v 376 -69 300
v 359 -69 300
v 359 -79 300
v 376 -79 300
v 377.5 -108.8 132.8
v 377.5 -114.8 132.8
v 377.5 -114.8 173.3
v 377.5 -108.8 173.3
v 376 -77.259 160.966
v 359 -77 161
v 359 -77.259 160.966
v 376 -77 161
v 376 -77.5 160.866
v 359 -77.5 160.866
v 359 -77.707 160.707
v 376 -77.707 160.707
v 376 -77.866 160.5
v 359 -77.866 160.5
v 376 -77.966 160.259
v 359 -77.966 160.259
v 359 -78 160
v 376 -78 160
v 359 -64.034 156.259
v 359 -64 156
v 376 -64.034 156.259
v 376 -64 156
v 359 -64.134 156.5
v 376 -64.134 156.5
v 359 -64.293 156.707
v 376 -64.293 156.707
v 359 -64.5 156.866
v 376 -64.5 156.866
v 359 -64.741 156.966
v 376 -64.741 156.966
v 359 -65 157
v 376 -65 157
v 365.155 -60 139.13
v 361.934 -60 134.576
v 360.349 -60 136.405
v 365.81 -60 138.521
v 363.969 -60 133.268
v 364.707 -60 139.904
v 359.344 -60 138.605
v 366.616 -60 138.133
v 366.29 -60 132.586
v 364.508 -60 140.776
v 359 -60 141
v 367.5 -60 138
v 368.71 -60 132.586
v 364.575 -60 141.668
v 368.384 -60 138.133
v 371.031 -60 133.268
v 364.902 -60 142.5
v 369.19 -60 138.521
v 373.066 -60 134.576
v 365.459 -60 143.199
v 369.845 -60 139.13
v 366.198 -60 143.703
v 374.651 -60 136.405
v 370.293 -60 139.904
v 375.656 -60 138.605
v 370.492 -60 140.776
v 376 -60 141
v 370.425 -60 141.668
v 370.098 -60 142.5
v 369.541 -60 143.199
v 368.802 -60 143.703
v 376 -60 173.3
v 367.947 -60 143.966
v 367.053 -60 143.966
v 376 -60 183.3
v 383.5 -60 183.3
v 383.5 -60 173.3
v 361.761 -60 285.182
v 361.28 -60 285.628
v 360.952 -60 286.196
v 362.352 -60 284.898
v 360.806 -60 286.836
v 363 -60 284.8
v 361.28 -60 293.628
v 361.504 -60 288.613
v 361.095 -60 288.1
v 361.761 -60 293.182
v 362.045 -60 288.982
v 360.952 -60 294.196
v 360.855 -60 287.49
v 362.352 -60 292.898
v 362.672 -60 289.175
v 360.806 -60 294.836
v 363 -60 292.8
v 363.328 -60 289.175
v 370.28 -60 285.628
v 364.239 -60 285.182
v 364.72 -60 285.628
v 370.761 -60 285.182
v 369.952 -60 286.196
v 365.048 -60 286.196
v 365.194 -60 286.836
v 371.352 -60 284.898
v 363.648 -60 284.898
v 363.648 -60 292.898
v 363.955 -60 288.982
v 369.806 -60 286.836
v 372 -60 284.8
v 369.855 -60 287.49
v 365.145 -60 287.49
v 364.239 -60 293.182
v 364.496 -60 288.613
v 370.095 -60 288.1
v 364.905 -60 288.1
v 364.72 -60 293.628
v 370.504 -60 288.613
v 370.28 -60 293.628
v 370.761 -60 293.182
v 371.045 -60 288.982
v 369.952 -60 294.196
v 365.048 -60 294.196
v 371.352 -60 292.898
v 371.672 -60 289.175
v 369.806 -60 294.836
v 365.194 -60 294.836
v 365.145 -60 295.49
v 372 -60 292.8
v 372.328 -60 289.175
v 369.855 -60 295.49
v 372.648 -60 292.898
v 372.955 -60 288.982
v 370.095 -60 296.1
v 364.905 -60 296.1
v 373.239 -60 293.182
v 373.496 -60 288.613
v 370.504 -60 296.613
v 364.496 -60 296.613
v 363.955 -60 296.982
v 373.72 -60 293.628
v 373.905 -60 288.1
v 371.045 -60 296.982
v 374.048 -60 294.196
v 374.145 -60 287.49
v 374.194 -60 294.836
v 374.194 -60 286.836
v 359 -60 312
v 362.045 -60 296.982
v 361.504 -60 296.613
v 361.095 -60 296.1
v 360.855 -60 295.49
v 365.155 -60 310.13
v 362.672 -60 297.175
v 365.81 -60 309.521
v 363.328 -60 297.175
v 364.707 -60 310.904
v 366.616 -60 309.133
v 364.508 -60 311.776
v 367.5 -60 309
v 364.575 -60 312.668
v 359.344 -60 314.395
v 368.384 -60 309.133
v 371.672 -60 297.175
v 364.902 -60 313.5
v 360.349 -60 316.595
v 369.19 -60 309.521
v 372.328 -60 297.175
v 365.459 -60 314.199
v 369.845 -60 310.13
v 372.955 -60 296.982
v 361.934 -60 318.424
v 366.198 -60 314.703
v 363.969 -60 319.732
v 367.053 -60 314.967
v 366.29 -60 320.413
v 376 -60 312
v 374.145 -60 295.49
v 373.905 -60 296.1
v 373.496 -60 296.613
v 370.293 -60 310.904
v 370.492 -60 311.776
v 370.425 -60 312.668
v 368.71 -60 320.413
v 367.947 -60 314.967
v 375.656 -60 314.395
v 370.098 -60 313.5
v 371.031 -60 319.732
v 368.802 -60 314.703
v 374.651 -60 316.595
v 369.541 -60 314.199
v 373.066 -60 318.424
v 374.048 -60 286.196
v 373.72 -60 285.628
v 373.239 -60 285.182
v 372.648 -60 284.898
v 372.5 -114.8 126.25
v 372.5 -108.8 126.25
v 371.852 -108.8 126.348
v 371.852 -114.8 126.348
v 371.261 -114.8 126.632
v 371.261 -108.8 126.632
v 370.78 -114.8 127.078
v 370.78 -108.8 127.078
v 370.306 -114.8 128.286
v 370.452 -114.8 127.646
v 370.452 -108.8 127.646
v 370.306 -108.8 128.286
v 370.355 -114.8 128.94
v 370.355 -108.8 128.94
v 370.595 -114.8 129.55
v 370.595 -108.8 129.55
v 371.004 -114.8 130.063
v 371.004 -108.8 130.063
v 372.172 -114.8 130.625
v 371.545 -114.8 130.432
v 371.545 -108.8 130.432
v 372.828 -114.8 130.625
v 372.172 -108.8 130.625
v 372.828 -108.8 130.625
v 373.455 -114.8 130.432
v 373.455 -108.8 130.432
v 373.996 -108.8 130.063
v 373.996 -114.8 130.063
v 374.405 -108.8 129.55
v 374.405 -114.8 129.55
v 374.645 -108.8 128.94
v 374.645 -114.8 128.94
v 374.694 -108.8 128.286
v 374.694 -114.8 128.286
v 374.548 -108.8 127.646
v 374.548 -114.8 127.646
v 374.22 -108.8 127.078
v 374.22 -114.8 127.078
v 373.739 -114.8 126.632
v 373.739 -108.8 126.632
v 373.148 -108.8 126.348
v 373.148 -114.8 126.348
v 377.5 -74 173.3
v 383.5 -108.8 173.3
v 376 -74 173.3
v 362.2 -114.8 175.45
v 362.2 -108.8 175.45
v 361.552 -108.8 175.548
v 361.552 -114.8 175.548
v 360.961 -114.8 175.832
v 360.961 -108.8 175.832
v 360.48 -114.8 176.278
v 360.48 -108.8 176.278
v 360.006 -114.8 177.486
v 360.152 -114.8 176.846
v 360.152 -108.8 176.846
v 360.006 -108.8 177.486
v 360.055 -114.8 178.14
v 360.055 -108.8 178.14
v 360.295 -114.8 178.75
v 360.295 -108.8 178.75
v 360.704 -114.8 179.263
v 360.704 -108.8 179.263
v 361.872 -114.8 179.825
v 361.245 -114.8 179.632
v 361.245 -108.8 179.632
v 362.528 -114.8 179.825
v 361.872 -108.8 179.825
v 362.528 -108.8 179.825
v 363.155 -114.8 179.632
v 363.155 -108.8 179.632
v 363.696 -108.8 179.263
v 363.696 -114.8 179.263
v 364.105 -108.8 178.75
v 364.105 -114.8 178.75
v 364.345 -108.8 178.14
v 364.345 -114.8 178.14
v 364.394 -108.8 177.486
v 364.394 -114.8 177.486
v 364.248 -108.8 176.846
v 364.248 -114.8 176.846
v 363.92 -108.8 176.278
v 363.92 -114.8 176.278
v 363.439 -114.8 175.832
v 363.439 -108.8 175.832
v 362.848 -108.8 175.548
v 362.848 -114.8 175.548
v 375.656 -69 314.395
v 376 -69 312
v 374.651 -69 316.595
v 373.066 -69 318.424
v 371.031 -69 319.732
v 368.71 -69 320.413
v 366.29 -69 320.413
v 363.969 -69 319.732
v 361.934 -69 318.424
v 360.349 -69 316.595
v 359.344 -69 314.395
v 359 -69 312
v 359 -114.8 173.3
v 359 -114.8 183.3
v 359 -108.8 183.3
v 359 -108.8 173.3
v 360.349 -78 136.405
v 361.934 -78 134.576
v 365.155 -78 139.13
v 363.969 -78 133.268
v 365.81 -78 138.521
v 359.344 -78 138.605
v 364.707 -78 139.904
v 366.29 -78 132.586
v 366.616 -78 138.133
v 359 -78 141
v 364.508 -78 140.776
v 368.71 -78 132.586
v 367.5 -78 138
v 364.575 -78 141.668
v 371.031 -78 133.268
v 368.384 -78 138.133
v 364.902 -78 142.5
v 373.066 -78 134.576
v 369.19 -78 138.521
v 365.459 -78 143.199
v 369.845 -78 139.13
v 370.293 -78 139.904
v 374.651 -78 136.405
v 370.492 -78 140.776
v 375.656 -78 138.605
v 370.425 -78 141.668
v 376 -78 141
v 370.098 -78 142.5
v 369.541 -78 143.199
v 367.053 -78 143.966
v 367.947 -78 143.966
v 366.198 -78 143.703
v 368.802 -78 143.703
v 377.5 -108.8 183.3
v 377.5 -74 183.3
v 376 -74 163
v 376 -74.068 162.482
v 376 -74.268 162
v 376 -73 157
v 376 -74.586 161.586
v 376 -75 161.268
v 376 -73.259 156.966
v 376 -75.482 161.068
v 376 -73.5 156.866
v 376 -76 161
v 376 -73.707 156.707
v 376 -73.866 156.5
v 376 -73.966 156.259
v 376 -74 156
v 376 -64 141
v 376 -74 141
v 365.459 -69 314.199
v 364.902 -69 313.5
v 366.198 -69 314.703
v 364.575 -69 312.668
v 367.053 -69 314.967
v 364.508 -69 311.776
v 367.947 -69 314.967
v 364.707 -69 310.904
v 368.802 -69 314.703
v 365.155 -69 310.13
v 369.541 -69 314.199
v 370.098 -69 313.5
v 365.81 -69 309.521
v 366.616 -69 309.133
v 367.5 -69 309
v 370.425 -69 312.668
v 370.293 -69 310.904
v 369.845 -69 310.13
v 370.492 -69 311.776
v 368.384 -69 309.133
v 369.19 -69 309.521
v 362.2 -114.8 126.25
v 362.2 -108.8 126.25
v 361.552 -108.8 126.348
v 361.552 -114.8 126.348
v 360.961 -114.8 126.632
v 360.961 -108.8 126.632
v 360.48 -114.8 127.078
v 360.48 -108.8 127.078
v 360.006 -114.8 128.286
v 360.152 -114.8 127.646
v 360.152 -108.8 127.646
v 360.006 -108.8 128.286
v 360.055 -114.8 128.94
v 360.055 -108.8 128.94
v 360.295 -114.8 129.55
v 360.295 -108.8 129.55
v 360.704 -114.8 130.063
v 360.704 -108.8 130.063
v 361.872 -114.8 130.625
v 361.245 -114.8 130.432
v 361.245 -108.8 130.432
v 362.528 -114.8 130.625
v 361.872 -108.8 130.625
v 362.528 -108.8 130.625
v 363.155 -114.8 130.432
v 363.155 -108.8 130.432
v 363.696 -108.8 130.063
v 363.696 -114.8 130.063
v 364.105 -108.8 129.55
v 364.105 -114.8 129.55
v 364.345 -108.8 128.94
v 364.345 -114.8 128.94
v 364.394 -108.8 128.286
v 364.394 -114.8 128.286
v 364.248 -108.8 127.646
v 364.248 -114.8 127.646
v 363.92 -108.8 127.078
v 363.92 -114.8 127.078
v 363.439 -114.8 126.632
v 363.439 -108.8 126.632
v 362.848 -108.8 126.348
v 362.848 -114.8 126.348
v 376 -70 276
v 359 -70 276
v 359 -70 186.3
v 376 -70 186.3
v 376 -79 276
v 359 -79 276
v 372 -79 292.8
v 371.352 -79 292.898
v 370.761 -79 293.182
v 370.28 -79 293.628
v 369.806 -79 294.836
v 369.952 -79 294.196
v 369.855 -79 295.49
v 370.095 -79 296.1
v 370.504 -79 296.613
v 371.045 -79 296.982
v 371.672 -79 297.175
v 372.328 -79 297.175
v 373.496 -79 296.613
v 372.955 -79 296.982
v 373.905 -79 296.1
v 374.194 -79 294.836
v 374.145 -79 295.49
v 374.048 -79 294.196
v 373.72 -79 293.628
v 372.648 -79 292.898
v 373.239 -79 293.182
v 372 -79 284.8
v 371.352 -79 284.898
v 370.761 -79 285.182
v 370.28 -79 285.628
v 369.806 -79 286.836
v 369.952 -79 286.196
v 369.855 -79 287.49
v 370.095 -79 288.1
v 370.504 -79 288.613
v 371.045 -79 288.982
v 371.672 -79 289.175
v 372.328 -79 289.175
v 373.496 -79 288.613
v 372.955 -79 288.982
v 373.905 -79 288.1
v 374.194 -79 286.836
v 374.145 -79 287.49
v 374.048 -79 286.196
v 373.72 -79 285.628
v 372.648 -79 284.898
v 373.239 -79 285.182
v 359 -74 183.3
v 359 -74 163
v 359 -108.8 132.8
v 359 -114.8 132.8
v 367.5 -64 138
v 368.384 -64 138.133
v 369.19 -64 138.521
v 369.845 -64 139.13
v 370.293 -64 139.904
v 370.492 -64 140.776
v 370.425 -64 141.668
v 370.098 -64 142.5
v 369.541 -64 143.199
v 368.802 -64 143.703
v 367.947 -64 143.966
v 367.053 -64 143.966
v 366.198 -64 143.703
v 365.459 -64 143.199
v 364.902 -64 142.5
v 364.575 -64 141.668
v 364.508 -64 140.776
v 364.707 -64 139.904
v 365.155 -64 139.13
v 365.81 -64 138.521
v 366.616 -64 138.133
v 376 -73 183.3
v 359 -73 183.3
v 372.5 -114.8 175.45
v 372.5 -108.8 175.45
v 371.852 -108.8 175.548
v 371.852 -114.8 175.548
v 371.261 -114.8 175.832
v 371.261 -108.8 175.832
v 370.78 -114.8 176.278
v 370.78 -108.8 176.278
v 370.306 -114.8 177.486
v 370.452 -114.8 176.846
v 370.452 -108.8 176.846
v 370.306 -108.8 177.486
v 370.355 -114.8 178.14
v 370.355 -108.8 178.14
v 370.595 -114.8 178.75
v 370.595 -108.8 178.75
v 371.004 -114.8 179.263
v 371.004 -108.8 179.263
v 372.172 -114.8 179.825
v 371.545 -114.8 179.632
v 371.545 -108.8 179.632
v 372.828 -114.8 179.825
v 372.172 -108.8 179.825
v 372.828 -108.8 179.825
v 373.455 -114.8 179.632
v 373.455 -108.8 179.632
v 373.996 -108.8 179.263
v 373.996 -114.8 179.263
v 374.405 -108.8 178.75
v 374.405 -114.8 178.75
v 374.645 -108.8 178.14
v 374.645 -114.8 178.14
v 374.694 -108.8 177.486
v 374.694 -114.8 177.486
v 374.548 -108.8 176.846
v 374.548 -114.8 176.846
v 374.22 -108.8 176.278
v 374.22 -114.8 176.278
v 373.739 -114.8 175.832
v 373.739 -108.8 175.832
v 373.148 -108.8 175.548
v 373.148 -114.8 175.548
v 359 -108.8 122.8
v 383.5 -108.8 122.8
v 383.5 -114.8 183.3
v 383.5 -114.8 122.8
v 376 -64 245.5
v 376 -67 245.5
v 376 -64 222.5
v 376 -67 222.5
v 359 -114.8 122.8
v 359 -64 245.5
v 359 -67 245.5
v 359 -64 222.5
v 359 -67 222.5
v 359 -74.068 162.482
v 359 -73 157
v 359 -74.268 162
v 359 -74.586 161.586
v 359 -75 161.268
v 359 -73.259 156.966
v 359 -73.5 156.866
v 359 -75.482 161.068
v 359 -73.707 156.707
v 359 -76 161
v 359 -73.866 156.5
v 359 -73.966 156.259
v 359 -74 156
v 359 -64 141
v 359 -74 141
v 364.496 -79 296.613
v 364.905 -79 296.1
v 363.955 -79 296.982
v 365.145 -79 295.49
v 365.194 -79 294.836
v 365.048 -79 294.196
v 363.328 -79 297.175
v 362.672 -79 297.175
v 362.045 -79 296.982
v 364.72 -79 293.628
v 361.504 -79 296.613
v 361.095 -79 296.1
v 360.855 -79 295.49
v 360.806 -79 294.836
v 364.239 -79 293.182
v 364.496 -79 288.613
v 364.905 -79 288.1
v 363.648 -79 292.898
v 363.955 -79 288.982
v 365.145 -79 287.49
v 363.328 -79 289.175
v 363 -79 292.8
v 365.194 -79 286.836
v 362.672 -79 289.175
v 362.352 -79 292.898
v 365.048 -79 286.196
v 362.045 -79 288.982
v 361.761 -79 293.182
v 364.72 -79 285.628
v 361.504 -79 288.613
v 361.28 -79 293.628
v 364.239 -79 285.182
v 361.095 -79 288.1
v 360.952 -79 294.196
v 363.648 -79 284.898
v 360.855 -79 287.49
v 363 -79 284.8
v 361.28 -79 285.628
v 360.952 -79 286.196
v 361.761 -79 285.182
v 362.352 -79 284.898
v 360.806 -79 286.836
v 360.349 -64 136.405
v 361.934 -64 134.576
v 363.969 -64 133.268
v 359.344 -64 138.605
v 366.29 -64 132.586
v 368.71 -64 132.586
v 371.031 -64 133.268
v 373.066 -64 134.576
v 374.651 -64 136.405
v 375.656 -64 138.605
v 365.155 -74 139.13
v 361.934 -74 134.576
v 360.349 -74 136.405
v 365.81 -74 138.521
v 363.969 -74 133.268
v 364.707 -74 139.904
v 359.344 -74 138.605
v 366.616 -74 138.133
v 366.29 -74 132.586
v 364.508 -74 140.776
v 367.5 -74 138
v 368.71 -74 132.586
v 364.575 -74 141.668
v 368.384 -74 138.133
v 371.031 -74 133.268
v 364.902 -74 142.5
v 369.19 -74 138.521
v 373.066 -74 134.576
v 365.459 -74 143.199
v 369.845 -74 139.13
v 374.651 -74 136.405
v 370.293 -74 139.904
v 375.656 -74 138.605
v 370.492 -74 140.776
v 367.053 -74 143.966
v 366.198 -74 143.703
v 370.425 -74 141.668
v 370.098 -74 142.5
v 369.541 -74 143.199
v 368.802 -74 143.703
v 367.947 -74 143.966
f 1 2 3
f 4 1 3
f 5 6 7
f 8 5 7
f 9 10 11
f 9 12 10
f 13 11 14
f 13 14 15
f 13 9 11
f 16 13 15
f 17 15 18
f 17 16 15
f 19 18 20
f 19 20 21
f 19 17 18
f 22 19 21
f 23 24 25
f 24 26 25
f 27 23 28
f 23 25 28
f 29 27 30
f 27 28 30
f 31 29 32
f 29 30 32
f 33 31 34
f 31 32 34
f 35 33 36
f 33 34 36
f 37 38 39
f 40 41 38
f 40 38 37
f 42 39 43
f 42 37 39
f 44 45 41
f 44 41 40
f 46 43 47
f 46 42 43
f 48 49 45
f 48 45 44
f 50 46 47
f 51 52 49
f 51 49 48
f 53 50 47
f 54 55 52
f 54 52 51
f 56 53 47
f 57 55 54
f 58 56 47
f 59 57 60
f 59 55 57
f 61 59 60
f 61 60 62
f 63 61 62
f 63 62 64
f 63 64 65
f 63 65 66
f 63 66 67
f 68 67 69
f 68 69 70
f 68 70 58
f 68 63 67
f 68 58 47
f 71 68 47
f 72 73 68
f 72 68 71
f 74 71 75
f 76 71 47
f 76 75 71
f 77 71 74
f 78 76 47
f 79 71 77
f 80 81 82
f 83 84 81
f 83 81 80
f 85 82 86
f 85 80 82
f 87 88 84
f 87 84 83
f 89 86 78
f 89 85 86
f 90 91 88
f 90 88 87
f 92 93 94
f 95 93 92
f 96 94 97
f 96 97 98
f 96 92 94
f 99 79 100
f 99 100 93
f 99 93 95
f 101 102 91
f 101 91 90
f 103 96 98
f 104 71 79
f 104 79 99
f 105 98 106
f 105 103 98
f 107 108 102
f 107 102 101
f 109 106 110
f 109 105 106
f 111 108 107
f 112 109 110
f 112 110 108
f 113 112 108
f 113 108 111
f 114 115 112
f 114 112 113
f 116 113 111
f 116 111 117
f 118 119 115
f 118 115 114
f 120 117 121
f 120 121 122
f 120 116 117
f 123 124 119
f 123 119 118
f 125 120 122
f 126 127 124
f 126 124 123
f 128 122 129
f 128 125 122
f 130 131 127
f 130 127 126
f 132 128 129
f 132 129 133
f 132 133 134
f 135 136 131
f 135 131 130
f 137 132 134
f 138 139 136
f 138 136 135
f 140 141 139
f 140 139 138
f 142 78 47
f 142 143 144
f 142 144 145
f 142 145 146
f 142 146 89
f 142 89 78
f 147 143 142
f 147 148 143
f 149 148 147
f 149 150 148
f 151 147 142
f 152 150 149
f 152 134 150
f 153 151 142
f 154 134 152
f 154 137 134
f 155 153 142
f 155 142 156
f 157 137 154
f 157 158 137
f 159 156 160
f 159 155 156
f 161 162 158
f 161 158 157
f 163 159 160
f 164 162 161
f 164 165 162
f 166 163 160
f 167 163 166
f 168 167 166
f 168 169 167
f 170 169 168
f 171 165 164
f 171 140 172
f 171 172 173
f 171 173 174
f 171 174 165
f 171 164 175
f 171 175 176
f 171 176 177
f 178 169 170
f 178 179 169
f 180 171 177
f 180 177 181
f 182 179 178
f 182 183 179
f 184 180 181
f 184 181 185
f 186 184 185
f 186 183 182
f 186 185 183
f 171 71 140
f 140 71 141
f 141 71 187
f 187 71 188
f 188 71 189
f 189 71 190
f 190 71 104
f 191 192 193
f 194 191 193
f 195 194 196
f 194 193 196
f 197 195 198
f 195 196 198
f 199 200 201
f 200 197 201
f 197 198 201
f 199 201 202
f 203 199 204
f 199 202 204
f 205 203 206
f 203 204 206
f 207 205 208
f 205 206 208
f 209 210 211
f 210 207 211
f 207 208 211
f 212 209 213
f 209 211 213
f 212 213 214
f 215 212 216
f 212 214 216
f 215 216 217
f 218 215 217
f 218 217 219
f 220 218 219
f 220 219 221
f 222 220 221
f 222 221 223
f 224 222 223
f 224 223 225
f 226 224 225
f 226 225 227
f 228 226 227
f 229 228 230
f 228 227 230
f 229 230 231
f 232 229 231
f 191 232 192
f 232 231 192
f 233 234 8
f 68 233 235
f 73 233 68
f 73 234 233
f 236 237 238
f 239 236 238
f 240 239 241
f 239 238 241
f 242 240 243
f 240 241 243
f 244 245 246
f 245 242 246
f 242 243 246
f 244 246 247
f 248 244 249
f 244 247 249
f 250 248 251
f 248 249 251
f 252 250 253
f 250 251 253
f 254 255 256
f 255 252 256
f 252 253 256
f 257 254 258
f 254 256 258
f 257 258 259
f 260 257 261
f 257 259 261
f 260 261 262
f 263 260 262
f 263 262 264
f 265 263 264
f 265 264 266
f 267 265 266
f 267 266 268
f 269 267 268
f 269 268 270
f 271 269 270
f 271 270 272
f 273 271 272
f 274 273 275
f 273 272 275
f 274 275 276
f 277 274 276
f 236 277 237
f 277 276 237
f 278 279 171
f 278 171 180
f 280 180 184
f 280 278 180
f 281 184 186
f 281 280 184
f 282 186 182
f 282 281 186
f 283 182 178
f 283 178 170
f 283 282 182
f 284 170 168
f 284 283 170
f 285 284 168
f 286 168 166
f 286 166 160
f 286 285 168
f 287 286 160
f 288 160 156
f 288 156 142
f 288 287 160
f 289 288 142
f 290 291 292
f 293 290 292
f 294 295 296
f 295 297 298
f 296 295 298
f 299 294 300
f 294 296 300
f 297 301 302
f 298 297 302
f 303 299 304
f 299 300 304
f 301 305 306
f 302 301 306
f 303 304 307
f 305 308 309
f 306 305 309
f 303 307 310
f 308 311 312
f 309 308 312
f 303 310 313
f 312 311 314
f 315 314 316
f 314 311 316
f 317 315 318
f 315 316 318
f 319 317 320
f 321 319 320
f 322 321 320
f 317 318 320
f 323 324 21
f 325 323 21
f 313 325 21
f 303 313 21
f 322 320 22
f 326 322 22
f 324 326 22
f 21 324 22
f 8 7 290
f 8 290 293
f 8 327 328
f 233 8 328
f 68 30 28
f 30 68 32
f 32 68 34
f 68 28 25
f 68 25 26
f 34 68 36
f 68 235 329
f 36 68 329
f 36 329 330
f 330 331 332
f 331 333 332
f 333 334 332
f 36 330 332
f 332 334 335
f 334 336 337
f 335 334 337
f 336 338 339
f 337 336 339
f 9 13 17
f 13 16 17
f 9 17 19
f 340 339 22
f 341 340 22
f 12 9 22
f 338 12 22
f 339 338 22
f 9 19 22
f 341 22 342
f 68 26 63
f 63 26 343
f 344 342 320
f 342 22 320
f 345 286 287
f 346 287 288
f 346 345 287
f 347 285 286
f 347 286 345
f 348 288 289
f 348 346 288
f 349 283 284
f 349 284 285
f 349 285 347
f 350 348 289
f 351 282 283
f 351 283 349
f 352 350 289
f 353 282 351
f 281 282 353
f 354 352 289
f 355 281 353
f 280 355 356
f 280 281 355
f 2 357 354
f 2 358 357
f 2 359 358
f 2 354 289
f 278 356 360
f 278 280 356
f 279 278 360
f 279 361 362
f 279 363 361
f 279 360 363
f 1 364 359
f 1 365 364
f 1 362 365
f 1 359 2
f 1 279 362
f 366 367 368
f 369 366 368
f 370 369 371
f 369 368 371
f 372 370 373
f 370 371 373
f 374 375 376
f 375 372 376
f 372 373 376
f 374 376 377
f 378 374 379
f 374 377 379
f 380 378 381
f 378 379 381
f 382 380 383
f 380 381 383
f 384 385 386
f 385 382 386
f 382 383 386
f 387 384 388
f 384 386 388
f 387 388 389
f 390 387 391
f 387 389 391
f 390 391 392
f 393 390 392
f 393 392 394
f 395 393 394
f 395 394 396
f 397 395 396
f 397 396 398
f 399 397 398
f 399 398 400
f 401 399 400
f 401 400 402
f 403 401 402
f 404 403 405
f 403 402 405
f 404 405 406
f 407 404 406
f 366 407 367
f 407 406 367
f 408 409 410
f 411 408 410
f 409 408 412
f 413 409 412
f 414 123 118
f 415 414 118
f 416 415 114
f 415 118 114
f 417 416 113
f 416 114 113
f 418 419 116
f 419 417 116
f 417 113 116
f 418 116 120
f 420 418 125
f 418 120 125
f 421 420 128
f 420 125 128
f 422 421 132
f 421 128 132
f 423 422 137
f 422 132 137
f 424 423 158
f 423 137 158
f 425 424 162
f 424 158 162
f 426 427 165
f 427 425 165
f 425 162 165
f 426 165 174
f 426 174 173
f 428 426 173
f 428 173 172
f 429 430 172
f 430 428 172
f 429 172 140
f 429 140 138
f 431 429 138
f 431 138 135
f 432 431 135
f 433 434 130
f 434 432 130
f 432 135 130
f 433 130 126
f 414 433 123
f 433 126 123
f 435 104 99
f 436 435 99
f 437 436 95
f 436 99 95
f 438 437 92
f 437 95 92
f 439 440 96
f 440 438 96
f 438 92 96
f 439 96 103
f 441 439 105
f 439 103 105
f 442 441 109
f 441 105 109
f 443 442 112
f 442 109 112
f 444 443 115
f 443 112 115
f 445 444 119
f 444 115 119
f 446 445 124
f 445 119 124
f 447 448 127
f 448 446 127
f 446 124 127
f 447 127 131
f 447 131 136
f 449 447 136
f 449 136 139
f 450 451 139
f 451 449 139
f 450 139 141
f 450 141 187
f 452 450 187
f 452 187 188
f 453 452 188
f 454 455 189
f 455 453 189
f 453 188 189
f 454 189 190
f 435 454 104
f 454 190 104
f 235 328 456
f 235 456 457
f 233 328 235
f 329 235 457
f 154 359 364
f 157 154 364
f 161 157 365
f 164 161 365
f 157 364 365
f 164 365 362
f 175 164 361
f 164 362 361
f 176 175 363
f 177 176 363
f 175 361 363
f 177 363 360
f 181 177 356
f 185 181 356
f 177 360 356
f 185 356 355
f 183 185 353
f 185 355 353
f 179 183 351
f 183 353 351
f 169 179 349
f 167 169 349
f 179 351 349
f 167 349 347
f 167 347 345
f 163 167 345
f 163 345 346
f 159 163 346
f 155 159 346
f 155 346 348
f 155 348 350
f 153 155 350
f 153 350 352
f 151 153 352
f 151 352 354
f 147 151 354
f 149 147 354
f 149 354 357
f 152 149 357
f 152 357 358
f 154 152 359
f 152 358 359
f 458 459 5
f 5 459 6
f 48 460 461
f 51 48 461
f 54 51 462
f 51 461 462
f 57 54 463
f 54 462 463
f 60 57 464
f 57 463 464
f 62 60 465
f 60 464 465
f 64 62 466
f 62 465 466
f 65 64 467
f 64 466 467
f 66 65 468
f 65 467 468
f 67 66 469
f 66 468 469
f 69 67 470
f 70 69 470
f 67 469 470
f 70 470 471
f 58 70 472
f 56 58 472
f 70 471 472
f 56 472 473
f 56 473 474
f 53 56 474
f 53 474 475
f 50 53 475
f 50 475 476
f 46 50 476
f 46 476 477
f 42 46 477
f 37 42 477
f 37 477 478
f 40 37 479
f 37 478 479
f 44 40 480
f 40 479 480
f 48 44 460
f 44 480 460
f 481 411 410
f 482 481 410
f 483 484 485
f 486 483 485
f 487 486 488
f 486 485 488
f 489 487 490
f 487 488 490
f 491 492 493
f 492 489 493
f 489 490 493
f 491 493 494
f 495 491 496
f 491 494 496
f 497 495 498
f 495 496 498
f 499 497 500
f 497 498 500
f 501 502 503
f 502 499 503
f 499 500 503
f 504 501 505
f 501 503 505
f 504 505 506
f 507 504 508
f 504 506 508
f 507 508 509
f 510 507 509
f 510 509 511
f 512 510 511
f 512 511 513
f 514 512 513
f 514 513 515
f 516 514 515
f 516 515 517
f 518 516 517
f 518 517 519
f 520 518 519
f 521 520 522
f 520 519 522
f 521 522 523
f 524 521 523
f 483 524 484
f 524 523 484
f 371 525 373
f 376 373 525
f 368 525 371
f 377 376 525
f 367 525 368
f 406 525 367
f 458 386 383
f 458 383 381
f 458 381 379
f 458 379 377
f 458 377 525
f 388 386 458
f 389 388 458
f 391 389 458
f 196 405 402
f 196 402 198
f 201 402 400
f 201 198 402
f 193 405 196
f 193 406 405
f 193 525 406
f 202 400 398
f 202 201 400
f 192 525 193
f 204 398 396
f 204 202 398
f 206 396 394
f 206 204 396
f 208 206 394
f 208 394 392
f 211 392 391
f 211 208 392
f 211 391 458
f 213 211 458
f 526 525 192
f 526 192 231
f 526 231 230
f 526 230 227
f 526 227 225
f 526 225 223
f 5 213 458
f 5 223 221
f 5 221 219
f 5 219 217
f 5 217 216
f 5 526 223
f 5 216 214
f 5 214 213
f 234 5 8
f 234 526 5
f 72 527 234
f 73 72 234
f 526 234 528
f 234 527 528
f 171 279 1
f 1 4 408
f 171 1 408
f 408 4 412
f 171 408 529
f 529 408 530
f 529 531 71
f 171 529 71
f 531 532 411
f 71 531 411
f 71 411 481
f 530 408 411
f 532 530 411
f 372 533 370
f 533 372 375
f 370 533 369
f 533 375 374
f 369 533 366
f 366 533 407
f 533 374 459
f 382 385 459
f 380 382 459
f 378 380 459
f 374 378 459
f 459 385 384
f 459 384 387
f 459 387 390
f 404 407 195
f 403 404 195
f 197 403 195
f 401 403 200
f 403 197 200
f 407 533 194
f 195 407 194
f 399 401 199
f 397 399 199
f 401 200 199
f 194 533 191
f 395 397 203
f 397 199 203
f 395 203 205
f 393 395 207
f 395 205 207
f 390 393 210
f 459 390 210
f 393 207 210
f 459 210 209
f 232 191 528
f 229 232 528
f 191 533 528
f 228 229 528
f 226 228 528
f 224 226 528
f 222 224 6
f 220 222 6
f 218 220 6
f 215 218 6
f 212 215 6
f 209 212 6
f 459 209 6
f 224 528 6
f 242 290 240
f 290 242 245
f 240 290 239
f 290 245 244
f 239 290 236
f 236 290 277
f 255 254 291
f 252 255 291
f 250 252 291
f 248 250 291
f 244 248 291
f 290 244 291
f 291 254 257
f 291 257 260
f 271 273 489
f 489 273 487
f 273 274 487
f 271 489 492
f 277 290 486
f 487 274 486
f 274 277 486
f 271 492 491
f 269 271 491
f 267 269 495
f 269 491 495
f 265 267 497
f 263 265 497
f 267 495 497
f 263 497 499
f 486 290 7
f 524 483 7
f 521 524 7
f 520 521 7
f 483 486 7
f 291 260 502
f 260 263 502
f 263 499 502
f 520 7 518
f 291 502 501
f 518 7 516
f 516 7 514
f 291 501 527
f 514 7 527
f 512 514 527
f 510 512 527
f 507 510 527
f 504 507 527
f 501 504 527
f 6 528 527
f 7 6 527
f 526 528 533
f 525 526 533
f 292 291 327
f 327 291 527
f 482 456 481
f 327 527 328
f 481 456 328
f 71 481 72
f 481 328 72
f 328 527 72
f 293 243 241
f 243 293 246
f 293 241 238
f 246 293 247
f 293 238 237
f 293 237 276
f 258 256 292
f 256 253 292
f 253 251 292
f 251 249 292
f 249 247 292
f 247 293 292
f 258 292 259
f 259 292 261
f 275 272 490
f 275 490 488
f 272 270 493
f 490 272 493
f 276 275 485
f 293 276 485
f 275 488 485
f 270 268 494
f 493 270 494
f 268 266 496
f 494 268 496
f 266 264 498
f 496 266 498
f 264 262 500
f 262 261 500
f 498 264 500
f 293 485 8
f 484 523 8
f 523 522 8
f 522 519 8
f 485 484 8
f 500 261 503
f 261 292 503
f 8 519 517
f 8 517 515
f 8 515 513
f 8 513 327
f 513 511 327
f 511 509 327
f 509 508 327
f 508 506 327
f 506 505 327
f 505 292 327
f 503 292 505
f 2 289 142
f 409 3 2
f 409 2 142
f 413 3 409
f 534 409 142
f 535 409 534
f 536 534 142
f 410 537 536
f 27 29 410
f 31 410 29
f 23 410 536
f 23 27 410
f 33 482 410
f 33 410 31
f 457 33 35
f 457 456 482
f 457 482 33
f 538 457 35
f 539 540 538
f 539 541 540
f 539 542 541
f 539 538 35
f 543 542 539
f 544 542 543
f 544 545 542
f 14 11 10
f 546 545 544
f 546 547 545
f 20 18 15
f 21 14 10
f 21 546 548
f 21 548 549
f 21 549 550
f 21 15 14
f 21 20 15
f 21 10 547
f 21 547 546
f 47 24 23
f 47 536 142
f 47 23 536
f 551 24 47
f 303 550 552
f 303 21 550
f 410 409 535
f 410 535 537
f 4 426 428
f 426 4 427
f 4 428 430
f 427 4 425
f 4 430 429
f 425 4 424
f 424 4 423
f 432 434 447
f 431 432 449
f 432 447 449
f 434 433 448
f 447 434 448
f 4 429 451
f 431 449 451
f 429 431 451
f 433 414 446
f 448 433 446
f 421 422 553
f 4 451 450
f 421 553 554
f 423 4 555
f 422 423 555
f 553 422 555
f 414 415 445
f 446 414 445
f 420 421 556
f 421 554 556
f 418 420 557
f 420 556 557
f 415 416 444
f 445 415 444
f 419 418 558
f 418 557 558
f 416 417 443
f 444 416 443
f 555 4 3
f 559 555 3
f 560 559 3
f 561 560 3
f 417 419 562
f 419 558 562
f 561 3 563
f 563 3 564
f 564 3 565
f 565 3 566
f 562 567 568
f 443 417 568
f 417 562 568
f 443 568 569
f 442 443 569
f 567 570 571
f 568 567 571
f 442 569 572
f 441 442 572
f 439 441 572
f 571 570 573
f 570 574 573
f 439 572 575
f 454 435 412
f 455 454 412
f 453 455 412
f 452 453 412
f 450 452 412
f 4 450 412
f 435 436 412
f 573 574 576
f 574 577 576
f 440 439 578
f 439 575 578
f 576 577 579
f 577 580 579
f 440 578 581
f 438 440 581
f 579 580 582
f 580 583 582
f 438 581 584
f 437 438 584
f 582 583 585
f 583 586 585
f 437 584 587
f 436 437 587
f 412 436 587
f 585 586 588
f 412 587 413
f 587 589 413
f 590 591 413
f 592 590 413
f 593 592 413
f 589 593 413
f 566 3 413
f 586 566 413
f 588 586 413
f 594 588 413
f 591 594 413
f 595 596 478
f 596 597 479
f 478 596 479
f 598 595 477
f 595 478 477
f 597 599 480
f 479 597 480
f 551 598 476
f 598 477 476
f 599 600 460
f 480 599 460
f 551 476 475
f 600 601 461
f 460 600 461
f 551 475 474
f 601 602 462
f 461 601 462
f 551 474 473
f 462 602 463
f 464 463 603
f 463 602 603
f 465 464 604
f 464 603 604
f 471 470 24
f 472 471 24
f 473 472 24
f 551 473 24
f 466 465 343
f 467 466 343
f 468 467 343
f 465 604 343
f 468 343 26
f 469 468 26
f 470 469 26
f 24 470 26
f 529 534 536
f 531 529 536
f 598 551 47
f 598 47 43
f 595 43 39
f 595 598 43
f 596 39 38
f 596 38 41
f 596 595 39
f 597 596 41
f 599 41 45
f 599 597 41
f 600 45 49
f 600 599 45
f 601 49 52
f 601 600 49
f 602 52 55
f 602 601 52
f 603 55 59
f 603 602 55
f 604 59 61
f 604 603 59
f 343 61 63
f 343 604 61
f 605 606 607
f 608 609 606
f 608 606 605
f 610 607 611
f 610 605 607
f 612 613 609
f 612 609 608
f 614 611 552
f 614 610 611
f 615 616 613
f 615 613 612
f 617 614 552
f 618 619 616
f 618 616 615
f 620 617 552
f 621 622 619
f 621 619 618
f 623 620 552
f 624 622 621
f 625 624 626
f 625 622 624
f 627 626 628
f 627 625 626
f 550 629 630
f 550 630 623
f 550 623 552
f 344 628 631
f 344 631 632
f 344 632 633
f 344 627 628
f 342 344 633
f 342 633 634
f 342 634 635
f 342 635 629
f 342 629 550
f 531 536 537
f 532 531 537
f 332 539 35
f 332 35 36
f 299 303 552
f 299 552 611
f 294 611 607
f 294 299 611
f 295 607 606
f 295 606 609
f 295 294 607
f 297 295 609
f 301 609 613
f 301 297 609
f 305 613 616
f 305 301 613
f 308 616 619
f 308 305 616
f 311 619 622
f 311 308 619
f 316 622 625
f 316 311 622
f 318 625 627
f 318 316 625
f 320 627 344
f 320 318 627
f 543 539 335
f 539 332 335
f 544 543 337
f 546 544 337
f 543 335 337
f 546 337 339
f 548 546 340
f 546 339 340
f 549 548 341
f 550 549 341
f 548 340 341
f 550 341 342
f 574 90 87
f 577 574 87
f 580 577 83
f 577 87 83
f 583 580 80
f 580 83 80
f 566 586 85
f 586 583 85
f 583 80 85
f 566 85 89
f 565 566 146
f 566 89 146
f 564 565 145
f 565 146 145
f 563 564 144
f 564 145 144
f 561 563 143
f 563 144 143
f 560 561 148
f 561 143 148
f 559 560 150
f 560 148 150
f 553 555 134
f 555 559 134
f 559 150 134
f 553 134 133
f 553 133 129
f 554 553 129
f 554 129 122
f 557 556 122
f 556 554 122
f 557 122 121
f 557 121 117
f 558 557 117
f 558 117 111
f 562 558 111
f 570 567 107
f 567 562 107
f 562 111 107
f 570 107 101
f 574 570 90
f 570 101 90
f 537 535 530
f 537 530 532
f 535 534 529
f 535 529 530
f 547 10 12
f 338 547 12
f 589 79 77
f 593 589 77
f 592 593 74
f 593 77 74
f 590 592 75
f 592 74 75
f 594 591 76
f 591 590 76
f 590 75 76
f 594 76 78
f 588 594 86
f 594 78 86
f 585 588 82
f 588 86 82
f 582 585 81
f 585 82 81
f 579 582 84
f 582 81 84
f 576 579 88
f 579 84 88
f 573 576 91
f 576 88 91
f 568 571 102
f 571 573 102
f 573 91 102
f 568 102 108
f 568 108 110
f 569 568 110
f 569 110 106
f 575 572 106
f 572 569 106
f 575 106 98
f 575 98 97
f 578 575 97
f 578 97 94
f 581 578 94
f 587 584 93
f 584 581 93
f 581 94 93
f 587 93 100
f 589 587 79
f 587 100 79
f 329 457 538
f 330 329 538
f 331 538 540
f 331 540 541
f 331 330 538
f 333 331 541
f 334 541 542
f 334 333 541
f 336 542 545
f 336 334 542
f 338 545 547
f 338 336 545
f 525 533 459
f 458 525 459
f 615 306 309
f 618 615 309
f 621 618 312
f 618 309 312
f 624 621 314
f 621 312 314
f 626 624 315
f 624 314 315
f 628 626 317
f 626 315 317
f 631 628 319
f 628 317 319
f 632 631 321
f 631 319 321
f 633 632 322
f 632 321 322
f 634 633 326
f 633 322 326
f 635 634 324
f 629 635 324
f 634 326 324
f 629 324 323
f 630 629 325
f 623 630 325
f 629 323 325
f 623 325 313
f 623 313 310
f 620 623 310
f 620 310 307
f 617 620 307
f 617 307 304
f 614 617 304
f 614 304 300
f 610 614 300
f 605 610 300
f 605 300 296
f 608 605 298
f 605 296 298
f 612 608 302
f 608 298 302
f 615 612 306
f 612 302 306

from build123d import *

# Parameters (mm, degrees)
CYLINDER044_R                 = 2.2
CYLINDER044_DEPTH             = 26
CYLINDER044_ROLL_ANGLE        = -90
ARRAY011_X_COUNT              = 2
ARRAY011_X_PITCH              = 8
ARRAY011_Z_COUNT              = 2
ARRAY011_Z_PITCH              = 9
BOX034_W                      = 24
BOX034_H                      = 10
BOX034_DEPTH                  = 17
SKETCH030_R                   = 3
PAD030_DEPTH                  = 9
BOX035_W                      = 35
BOX035_H                      = 15
BOX035_DEPTH                  = 20
BOX032_W                      = 23
BOX032_H                      = 3
BOX032_DEPTH                  = 20
SKETCH024_R                   = 3
PAD024_DEPTH                  = 4
SKETCH025_R                   = 3
PAD025_DEPTH                  = 4
BOX029_W                      = 20
BOX029_H                      = 17
BOX029_DEPTH                  = 10
FILLET009_R                   = 1
FILLET009_ROLL_ANGLE          = 90
FILLET010_1_R                 = 2
FILLET010_2_R                 = 1
BOX028_W                      = 167
BOX028_H                      = 10
BOX028_DEPTH                  = 17
CYLINDER040_R                 = 2.2
CYLINDER040_DEPTH             = 18
CYLINDER040_ROLL_ANGLE        = -90
ARRAY008_X_COUNT              = 2
ARRAY008_X_PITCH              = 49.2
ARRAY008_Z_COUNT              = 2
ARRAY008_Z_PITCH              = 10.3
PAD029_DEPTH                  = 6
PAD028_DEPTH                  = 10
CHAMFER003_SIZE               = 3
PART_MIRRORING005_PITCH_ANGLE = 90


with BuildPart() as taladros_suje_traccion006:
    # Cylinder044 → Cylinder044 (new body)
    with BuildSketch(Plane.XY):
        Circle(CYLINDER044_R)
    extrude(amount=CYLINDER044_DEPTH)


with BuildPart() as taladros_suje_traccion006_1:
    # Cylinder044 roll: moved
    add(taladros_suje_traccion006.part.rotate(Axis((0, 0, 0), (1, 0, 0)), CYLINDER044_ROLL_ANGLE))


with BuildPart() as taladros_suje_traccion006_2:
    # Cylinder044 placement: moved
    add(taladros_suje_traccion006_1.part.moved(Location((202, 0, 4))))

    # Array011 X: Taladros_suje_traccion006 ×2


with BuildPart() as taladros_suje_traccion006_3:
    add(taladros_suje_traccion006_2.part)
    with Locations(*[(i * ARRAY011_X_PITCH, 0, 0) for i in range(1, ARRAY011_X_COUNT)]):
        add(taladros_suje_traccion006_2.part)

    # Array011 Z: Taladros_suje_traccion006 ×2


with BuildPart() as taladros_suje_traccion006_4:
    add(taladros_suje_traccion006_3.part)
    with Locations(*[(0, 0, i * ARRAY011_Z_PITCH) for i in range(1, ARRAY011_Z_COUNT)]):
        add(taladros_suje_traccion006_3.part)


with BuildPart() as taladros_suje_traccion006_5:
    # Array011 placement: moved
    add(taladros_suje_traccion006_4.part.moved(Location((-171, -5, 0))))


with BuildPart() as suj_traccion003:
    # Box034 → Box034 (new body)
    with BuildSketch(Plane(origin=(26, 6, 0), x_dir=(1, 0, 0), z_dir=(0, 0, 1))):
        with Locations((12, 5)):
            Rectangle(BOX034_W, BOX034_H)
    extrude(amount=BOX034_DEPTH)


with BuildPart() as circulo_tibia_gancho003:
    # Sketch030 → Pad030 (new body)
    with BuildSketch(Plane(origin=(50, 6, 0), x_dir=(1, 0, 0), z_dir=(0, -1, 0))):
        with BuildLine():
            Line((0, 17), (-36, 17))
            ThreePointArc((-36, 17), (-44.500015, 8.5), (-36, 0))
            Line((-36, 0), (0, 0))
            Line((0, 0), (0, 17))
        make_face()
        with Locations((-36.000015, 8.5)):
            Circle(SKETCH030_R, mode=Mode.SUBTRACT)
    extrude(amount=PAD030_DEPTH)


with BuildPart() as resta_redondeo_punta001:
    # Box035 → Box035 (new body)
    with BuildSketch(Plane(origin=(-2, -5, 0), x_dir=(1, 0, 0), z_dir=(0, 0, 1))):
        with Locations((17.5, 7.5)):
            Rectangle(BOX035_W, BOX035_H)
    extrude(amount=BOX035_DEPTH)


with BuildPart() as agarre002:
    # Box032 → Box032 (new body)
    with BuildSketch(Plane(origin=(80.5, 1, 0), x_dir=(1, 0, 0), z_dir=(0, 0, 1))):
        with Locations((11.5, 1.5)):
            Rectangle(BOX032_W, BOX032_H)
    extrude(amount=BOX032_DEPTH)


with BuildPart() as ciculo_gancho007:
    # Sketch024 → Pad024 (new body)
    with BuildSketch(Plane.XY):
        with BuildLine():
            Line((0, 17), (20, 17))
            ThreePointArc((20, 0), (28.500019, 8.5), (20, 17))
            Line((20, 0), (0, 0))
            Line((0, 0), (0, 17))
        make_face()
        with Locations((20.000019, 8.5)):
            Circle(SKETCH024_R, mode=Mode.SUBTRACT)
    extrude(amount=PAD024_DEPTH)


with BuildPart() as ciculo_gancho008:
    # Sketch025 → Pad025 (new body)
    with BuildSketch(Plane.XY.offset(14)):
        with BuildLine():
            Line((0, 17), (20, 17))
            ThreePointArc((20, 0), (28.500019, 8.5), (20, 17))
            Line((20, 0), (0, 0))
            Line((0, 0), (0, 17))
        make_face()
        with Locations((20.000019, 8.5)):
            Circle(SKETCH025_R, mode=Mode.SUBTRACT)
    extrude(amount=PAD025_DEPTH)


with BuildPart() as gancho_femur001:
    # Box029 → Box029 (new body)
    with BuildSketch(Plane(origin=(-16, 0, 4), x_dir=(1, 0, 0), z_dir=(0, 0, 1))):
        with Locations((10, 8.5)):
            Rectangle(BOX029_W, BOX029_H)
    extrude(amount=BOX029_DEPTH)

    # Fusion009003028: union Ciculo_gancho007, Ciculo_gancho008
    add(ciculo_gancho007.part)
    add(ciculo_gancho008.part)

    # Fillet009
    fillet009_edges = [gancho_femur001.edges().sort_by_distance(p)[0] for p in [
        (0, 8.5, 18),
        (-16, 0, 9),
        (-16, 17, 9),
        (0, 8.5, 0),
    ]]
    fillet(fillet009_edges, radius=FILLET009_R)


with BuildPart() as gancho_femur001_1:
    # Fillet009 roll: moved
    add(gancho_femur001.part.rotate(Axis((0, 0, 0), (1, 0, 0)), FILLET009_ROLL_ANGLE))


with BuildPart() as gancho_femur001_2:
    # Fillet009 placement: moved
    add(gancho_femur001_1.part.moved(Location((16, 15, 0))))

    # Fillet010 1
    fillet010_1_edges = [gancho_femur001_2.edges().sort_by_distance(p)[0] for p in [
        (16, 1, 8.5),
        (16, 11, 8.5),
    ]]
    fillet(fillet010_1_edges, radius=FILLET010_1_R)

    # Fillet010 2
    fillet010_2_edges = [gancho_femur001_2.edges().sort_by_distance(p)[0] for p in [
        (20, 1, 8.5),
        (20, 11, 8.5),
    ]]
    fillet(fillet010_2_edges, radius=FILLET010_2_R)


with BuildPart() as gancho_femur001_3:
    # Fillet010 placement: moved
    add(gancho_femur001_2.part.moved(Location((149, 0, 0))))


with BuildPart() as femur_agarre001:
    # Box028 → Box028 (new body)
    with BuildSketch(Plane(origin=(0, -3, 0), x_dir=(1, 0, 0), z_dir=(0, 0, 1))):
        with Locations((83.5, 5)):
            Rectangle(BOX028_W, BOX028_H)
    extrude(amount=BOX028_DEPTH)

    # Fusion009003029: union Gancho_femur001
    add(gancho_femur001_3.part)

    # Cut023: cut Agarre002
    add(agarre002.part, mode=Mode.SUBTRACT)


with BuildPart() as taladros_suje_motor003:
    # Cylinder040 → Cylinder040 (new body)
    with BuildSketch(Plane.XY):
        Circle(CYLINDER040_R)
    extrude(amount=CYLINDER040_DEPTH)


with BuildPart() as taladros_suje_motor003_1:
    # Cylinder040 roll: moved
    add(taladros_suje_motor003.part.rotate(Axis((0, 0, 0), (1, 0, 0)), CYLINDER040_ROLL_ANGLE))


with BuildPart() as taladros_suje_motor003_2:
    # Cylinder040 placement: moved
    add(taladros_suje_motor003_1.part.moved(Location((150.075, 41, 13.5))))

    # Array008 X: Taladros_suje_motor003 ×2


with BuildPart() as taladros_suje_motor003_3:
    add(taladros_suje_motor003_2.part)
    with Locations(*[(i * ARRAY008_X_PITCH, 0, 0) for i in range(1, ARRAY008_X_COUNT)]):
        add(taladros_suje_motor003_2.part)

    # Array008 Z: Taladros_suje_motor003 ×2


with BuildPart() as taladros_suje_motor003_4:
    add(taladros_suje_motor003_3.part)
    with Locations(*[(0, 0, -i * ARRAY008_Z_PITCH) for i in range(1, ARRAY008_Z_COUNT)]):
        add(taladros_suje_motor003_3.part)


with BuildPart() as suje_motor010:
    # Sketch029 → Pad029 (new body)
    with BuildSketch(Plane(origin=(10, 54.8, 0), x_dir=(1, 0, 0), z_dir=(0, -1, 0))):
        Polygon((0, 18.5), (0, 24.5), (50.5, 24.5), (50.5, 0), (40.5, 0), (40.5, 18.5), align=None)
    extrude(amount=PAD029_DEPTH)


with BuildPart() as femur_completo_sin_pulir001:
    # Sketch028 → Pad028 (new body)
    with BuildSketch(Plane.YZ):
        Polygon((14, 0), (0, 0), (0, 24.5), (54.8, 24.5), (54.8, 0), (48.8, 0), (48.8, 18.5), (14, 18.5), align=None)
    extrude(amount=PAD028_DEPTH)

    # Fusion009003033: union Suje_motor010
    add(suje_motor010.part)


with BuildPart() as femur_completo_sin_pulir001_1:
    # Fusion009003033 placement: moved
    add(femur_completo_sin_pulir001.part.moved(Location((144.425, -3, 0))))

    # Cut022: cut Taladros_suje_motor003
    add(taladros_suje_motor003_4.part, mode=Mode.SUBTRACT)


with BuildPart() as femur_completo_sin_pulir001_2:
    # Cut022 placement: moved
    add(femur_completo_sin_pulir001_1.part.moved(Location((-1.725, 0, 0))))

    # Fusion009003034: union Femur_agarre001
    add(femur_agarre001.part)

    # Chamfer003
    chamfer003_edges = [femur_completo_sin_pulir001_2.edges().sort_by_distance(p)[0] for p in [
        (142.7, 7, 8.5),
    ]]
    chamfer(chamfer003_edges, length=CHAMFER003_SIZE)

    # Cut027: cut resta_redondeo_punta001
    add(resta_redondeo_punta001.part, mode=Mode.SUBTRACT)

    # Fusion009003036: union Circulo_tibia_gancho003
    add(circulo_tibia_gancho003.part)

    # Fusion009003037: union Suj_traccion003
    add(suj_traccion003.part)

    # Cut028: cut Taladros_suje_traccion006
    add(taladros_suje_traccion006_5.part, mode=Mode.SUBTRACT)


with BuildPart() as part_mirroring005:
    # Part__Mirroring005: instance of Femur_completo_sin_pulir001
    add(femur_completo_sin_pulir001_2.part.mirror(Plane(origin=(0, 0, 0), x_dir=(1, 0, 0), z_dir=(0, 1, 0))))


with BuildPart() as part_mirroring005_1:
    # Part__Mirroring005 pitch: moved
    add(part_mirroring005.part.rotate(Axis((0, 0, 0), (0, 1, 0)), PART_MIRRORING005_PITCH_ANGLE))


with BuildPart() as part_mirroring005_2:
    # Part__Mirroring005 placement: moved
    add(part_mirroring005_1.part.moved(Location((359, -63, 326))))


solid = part_mirroring005_2.part
